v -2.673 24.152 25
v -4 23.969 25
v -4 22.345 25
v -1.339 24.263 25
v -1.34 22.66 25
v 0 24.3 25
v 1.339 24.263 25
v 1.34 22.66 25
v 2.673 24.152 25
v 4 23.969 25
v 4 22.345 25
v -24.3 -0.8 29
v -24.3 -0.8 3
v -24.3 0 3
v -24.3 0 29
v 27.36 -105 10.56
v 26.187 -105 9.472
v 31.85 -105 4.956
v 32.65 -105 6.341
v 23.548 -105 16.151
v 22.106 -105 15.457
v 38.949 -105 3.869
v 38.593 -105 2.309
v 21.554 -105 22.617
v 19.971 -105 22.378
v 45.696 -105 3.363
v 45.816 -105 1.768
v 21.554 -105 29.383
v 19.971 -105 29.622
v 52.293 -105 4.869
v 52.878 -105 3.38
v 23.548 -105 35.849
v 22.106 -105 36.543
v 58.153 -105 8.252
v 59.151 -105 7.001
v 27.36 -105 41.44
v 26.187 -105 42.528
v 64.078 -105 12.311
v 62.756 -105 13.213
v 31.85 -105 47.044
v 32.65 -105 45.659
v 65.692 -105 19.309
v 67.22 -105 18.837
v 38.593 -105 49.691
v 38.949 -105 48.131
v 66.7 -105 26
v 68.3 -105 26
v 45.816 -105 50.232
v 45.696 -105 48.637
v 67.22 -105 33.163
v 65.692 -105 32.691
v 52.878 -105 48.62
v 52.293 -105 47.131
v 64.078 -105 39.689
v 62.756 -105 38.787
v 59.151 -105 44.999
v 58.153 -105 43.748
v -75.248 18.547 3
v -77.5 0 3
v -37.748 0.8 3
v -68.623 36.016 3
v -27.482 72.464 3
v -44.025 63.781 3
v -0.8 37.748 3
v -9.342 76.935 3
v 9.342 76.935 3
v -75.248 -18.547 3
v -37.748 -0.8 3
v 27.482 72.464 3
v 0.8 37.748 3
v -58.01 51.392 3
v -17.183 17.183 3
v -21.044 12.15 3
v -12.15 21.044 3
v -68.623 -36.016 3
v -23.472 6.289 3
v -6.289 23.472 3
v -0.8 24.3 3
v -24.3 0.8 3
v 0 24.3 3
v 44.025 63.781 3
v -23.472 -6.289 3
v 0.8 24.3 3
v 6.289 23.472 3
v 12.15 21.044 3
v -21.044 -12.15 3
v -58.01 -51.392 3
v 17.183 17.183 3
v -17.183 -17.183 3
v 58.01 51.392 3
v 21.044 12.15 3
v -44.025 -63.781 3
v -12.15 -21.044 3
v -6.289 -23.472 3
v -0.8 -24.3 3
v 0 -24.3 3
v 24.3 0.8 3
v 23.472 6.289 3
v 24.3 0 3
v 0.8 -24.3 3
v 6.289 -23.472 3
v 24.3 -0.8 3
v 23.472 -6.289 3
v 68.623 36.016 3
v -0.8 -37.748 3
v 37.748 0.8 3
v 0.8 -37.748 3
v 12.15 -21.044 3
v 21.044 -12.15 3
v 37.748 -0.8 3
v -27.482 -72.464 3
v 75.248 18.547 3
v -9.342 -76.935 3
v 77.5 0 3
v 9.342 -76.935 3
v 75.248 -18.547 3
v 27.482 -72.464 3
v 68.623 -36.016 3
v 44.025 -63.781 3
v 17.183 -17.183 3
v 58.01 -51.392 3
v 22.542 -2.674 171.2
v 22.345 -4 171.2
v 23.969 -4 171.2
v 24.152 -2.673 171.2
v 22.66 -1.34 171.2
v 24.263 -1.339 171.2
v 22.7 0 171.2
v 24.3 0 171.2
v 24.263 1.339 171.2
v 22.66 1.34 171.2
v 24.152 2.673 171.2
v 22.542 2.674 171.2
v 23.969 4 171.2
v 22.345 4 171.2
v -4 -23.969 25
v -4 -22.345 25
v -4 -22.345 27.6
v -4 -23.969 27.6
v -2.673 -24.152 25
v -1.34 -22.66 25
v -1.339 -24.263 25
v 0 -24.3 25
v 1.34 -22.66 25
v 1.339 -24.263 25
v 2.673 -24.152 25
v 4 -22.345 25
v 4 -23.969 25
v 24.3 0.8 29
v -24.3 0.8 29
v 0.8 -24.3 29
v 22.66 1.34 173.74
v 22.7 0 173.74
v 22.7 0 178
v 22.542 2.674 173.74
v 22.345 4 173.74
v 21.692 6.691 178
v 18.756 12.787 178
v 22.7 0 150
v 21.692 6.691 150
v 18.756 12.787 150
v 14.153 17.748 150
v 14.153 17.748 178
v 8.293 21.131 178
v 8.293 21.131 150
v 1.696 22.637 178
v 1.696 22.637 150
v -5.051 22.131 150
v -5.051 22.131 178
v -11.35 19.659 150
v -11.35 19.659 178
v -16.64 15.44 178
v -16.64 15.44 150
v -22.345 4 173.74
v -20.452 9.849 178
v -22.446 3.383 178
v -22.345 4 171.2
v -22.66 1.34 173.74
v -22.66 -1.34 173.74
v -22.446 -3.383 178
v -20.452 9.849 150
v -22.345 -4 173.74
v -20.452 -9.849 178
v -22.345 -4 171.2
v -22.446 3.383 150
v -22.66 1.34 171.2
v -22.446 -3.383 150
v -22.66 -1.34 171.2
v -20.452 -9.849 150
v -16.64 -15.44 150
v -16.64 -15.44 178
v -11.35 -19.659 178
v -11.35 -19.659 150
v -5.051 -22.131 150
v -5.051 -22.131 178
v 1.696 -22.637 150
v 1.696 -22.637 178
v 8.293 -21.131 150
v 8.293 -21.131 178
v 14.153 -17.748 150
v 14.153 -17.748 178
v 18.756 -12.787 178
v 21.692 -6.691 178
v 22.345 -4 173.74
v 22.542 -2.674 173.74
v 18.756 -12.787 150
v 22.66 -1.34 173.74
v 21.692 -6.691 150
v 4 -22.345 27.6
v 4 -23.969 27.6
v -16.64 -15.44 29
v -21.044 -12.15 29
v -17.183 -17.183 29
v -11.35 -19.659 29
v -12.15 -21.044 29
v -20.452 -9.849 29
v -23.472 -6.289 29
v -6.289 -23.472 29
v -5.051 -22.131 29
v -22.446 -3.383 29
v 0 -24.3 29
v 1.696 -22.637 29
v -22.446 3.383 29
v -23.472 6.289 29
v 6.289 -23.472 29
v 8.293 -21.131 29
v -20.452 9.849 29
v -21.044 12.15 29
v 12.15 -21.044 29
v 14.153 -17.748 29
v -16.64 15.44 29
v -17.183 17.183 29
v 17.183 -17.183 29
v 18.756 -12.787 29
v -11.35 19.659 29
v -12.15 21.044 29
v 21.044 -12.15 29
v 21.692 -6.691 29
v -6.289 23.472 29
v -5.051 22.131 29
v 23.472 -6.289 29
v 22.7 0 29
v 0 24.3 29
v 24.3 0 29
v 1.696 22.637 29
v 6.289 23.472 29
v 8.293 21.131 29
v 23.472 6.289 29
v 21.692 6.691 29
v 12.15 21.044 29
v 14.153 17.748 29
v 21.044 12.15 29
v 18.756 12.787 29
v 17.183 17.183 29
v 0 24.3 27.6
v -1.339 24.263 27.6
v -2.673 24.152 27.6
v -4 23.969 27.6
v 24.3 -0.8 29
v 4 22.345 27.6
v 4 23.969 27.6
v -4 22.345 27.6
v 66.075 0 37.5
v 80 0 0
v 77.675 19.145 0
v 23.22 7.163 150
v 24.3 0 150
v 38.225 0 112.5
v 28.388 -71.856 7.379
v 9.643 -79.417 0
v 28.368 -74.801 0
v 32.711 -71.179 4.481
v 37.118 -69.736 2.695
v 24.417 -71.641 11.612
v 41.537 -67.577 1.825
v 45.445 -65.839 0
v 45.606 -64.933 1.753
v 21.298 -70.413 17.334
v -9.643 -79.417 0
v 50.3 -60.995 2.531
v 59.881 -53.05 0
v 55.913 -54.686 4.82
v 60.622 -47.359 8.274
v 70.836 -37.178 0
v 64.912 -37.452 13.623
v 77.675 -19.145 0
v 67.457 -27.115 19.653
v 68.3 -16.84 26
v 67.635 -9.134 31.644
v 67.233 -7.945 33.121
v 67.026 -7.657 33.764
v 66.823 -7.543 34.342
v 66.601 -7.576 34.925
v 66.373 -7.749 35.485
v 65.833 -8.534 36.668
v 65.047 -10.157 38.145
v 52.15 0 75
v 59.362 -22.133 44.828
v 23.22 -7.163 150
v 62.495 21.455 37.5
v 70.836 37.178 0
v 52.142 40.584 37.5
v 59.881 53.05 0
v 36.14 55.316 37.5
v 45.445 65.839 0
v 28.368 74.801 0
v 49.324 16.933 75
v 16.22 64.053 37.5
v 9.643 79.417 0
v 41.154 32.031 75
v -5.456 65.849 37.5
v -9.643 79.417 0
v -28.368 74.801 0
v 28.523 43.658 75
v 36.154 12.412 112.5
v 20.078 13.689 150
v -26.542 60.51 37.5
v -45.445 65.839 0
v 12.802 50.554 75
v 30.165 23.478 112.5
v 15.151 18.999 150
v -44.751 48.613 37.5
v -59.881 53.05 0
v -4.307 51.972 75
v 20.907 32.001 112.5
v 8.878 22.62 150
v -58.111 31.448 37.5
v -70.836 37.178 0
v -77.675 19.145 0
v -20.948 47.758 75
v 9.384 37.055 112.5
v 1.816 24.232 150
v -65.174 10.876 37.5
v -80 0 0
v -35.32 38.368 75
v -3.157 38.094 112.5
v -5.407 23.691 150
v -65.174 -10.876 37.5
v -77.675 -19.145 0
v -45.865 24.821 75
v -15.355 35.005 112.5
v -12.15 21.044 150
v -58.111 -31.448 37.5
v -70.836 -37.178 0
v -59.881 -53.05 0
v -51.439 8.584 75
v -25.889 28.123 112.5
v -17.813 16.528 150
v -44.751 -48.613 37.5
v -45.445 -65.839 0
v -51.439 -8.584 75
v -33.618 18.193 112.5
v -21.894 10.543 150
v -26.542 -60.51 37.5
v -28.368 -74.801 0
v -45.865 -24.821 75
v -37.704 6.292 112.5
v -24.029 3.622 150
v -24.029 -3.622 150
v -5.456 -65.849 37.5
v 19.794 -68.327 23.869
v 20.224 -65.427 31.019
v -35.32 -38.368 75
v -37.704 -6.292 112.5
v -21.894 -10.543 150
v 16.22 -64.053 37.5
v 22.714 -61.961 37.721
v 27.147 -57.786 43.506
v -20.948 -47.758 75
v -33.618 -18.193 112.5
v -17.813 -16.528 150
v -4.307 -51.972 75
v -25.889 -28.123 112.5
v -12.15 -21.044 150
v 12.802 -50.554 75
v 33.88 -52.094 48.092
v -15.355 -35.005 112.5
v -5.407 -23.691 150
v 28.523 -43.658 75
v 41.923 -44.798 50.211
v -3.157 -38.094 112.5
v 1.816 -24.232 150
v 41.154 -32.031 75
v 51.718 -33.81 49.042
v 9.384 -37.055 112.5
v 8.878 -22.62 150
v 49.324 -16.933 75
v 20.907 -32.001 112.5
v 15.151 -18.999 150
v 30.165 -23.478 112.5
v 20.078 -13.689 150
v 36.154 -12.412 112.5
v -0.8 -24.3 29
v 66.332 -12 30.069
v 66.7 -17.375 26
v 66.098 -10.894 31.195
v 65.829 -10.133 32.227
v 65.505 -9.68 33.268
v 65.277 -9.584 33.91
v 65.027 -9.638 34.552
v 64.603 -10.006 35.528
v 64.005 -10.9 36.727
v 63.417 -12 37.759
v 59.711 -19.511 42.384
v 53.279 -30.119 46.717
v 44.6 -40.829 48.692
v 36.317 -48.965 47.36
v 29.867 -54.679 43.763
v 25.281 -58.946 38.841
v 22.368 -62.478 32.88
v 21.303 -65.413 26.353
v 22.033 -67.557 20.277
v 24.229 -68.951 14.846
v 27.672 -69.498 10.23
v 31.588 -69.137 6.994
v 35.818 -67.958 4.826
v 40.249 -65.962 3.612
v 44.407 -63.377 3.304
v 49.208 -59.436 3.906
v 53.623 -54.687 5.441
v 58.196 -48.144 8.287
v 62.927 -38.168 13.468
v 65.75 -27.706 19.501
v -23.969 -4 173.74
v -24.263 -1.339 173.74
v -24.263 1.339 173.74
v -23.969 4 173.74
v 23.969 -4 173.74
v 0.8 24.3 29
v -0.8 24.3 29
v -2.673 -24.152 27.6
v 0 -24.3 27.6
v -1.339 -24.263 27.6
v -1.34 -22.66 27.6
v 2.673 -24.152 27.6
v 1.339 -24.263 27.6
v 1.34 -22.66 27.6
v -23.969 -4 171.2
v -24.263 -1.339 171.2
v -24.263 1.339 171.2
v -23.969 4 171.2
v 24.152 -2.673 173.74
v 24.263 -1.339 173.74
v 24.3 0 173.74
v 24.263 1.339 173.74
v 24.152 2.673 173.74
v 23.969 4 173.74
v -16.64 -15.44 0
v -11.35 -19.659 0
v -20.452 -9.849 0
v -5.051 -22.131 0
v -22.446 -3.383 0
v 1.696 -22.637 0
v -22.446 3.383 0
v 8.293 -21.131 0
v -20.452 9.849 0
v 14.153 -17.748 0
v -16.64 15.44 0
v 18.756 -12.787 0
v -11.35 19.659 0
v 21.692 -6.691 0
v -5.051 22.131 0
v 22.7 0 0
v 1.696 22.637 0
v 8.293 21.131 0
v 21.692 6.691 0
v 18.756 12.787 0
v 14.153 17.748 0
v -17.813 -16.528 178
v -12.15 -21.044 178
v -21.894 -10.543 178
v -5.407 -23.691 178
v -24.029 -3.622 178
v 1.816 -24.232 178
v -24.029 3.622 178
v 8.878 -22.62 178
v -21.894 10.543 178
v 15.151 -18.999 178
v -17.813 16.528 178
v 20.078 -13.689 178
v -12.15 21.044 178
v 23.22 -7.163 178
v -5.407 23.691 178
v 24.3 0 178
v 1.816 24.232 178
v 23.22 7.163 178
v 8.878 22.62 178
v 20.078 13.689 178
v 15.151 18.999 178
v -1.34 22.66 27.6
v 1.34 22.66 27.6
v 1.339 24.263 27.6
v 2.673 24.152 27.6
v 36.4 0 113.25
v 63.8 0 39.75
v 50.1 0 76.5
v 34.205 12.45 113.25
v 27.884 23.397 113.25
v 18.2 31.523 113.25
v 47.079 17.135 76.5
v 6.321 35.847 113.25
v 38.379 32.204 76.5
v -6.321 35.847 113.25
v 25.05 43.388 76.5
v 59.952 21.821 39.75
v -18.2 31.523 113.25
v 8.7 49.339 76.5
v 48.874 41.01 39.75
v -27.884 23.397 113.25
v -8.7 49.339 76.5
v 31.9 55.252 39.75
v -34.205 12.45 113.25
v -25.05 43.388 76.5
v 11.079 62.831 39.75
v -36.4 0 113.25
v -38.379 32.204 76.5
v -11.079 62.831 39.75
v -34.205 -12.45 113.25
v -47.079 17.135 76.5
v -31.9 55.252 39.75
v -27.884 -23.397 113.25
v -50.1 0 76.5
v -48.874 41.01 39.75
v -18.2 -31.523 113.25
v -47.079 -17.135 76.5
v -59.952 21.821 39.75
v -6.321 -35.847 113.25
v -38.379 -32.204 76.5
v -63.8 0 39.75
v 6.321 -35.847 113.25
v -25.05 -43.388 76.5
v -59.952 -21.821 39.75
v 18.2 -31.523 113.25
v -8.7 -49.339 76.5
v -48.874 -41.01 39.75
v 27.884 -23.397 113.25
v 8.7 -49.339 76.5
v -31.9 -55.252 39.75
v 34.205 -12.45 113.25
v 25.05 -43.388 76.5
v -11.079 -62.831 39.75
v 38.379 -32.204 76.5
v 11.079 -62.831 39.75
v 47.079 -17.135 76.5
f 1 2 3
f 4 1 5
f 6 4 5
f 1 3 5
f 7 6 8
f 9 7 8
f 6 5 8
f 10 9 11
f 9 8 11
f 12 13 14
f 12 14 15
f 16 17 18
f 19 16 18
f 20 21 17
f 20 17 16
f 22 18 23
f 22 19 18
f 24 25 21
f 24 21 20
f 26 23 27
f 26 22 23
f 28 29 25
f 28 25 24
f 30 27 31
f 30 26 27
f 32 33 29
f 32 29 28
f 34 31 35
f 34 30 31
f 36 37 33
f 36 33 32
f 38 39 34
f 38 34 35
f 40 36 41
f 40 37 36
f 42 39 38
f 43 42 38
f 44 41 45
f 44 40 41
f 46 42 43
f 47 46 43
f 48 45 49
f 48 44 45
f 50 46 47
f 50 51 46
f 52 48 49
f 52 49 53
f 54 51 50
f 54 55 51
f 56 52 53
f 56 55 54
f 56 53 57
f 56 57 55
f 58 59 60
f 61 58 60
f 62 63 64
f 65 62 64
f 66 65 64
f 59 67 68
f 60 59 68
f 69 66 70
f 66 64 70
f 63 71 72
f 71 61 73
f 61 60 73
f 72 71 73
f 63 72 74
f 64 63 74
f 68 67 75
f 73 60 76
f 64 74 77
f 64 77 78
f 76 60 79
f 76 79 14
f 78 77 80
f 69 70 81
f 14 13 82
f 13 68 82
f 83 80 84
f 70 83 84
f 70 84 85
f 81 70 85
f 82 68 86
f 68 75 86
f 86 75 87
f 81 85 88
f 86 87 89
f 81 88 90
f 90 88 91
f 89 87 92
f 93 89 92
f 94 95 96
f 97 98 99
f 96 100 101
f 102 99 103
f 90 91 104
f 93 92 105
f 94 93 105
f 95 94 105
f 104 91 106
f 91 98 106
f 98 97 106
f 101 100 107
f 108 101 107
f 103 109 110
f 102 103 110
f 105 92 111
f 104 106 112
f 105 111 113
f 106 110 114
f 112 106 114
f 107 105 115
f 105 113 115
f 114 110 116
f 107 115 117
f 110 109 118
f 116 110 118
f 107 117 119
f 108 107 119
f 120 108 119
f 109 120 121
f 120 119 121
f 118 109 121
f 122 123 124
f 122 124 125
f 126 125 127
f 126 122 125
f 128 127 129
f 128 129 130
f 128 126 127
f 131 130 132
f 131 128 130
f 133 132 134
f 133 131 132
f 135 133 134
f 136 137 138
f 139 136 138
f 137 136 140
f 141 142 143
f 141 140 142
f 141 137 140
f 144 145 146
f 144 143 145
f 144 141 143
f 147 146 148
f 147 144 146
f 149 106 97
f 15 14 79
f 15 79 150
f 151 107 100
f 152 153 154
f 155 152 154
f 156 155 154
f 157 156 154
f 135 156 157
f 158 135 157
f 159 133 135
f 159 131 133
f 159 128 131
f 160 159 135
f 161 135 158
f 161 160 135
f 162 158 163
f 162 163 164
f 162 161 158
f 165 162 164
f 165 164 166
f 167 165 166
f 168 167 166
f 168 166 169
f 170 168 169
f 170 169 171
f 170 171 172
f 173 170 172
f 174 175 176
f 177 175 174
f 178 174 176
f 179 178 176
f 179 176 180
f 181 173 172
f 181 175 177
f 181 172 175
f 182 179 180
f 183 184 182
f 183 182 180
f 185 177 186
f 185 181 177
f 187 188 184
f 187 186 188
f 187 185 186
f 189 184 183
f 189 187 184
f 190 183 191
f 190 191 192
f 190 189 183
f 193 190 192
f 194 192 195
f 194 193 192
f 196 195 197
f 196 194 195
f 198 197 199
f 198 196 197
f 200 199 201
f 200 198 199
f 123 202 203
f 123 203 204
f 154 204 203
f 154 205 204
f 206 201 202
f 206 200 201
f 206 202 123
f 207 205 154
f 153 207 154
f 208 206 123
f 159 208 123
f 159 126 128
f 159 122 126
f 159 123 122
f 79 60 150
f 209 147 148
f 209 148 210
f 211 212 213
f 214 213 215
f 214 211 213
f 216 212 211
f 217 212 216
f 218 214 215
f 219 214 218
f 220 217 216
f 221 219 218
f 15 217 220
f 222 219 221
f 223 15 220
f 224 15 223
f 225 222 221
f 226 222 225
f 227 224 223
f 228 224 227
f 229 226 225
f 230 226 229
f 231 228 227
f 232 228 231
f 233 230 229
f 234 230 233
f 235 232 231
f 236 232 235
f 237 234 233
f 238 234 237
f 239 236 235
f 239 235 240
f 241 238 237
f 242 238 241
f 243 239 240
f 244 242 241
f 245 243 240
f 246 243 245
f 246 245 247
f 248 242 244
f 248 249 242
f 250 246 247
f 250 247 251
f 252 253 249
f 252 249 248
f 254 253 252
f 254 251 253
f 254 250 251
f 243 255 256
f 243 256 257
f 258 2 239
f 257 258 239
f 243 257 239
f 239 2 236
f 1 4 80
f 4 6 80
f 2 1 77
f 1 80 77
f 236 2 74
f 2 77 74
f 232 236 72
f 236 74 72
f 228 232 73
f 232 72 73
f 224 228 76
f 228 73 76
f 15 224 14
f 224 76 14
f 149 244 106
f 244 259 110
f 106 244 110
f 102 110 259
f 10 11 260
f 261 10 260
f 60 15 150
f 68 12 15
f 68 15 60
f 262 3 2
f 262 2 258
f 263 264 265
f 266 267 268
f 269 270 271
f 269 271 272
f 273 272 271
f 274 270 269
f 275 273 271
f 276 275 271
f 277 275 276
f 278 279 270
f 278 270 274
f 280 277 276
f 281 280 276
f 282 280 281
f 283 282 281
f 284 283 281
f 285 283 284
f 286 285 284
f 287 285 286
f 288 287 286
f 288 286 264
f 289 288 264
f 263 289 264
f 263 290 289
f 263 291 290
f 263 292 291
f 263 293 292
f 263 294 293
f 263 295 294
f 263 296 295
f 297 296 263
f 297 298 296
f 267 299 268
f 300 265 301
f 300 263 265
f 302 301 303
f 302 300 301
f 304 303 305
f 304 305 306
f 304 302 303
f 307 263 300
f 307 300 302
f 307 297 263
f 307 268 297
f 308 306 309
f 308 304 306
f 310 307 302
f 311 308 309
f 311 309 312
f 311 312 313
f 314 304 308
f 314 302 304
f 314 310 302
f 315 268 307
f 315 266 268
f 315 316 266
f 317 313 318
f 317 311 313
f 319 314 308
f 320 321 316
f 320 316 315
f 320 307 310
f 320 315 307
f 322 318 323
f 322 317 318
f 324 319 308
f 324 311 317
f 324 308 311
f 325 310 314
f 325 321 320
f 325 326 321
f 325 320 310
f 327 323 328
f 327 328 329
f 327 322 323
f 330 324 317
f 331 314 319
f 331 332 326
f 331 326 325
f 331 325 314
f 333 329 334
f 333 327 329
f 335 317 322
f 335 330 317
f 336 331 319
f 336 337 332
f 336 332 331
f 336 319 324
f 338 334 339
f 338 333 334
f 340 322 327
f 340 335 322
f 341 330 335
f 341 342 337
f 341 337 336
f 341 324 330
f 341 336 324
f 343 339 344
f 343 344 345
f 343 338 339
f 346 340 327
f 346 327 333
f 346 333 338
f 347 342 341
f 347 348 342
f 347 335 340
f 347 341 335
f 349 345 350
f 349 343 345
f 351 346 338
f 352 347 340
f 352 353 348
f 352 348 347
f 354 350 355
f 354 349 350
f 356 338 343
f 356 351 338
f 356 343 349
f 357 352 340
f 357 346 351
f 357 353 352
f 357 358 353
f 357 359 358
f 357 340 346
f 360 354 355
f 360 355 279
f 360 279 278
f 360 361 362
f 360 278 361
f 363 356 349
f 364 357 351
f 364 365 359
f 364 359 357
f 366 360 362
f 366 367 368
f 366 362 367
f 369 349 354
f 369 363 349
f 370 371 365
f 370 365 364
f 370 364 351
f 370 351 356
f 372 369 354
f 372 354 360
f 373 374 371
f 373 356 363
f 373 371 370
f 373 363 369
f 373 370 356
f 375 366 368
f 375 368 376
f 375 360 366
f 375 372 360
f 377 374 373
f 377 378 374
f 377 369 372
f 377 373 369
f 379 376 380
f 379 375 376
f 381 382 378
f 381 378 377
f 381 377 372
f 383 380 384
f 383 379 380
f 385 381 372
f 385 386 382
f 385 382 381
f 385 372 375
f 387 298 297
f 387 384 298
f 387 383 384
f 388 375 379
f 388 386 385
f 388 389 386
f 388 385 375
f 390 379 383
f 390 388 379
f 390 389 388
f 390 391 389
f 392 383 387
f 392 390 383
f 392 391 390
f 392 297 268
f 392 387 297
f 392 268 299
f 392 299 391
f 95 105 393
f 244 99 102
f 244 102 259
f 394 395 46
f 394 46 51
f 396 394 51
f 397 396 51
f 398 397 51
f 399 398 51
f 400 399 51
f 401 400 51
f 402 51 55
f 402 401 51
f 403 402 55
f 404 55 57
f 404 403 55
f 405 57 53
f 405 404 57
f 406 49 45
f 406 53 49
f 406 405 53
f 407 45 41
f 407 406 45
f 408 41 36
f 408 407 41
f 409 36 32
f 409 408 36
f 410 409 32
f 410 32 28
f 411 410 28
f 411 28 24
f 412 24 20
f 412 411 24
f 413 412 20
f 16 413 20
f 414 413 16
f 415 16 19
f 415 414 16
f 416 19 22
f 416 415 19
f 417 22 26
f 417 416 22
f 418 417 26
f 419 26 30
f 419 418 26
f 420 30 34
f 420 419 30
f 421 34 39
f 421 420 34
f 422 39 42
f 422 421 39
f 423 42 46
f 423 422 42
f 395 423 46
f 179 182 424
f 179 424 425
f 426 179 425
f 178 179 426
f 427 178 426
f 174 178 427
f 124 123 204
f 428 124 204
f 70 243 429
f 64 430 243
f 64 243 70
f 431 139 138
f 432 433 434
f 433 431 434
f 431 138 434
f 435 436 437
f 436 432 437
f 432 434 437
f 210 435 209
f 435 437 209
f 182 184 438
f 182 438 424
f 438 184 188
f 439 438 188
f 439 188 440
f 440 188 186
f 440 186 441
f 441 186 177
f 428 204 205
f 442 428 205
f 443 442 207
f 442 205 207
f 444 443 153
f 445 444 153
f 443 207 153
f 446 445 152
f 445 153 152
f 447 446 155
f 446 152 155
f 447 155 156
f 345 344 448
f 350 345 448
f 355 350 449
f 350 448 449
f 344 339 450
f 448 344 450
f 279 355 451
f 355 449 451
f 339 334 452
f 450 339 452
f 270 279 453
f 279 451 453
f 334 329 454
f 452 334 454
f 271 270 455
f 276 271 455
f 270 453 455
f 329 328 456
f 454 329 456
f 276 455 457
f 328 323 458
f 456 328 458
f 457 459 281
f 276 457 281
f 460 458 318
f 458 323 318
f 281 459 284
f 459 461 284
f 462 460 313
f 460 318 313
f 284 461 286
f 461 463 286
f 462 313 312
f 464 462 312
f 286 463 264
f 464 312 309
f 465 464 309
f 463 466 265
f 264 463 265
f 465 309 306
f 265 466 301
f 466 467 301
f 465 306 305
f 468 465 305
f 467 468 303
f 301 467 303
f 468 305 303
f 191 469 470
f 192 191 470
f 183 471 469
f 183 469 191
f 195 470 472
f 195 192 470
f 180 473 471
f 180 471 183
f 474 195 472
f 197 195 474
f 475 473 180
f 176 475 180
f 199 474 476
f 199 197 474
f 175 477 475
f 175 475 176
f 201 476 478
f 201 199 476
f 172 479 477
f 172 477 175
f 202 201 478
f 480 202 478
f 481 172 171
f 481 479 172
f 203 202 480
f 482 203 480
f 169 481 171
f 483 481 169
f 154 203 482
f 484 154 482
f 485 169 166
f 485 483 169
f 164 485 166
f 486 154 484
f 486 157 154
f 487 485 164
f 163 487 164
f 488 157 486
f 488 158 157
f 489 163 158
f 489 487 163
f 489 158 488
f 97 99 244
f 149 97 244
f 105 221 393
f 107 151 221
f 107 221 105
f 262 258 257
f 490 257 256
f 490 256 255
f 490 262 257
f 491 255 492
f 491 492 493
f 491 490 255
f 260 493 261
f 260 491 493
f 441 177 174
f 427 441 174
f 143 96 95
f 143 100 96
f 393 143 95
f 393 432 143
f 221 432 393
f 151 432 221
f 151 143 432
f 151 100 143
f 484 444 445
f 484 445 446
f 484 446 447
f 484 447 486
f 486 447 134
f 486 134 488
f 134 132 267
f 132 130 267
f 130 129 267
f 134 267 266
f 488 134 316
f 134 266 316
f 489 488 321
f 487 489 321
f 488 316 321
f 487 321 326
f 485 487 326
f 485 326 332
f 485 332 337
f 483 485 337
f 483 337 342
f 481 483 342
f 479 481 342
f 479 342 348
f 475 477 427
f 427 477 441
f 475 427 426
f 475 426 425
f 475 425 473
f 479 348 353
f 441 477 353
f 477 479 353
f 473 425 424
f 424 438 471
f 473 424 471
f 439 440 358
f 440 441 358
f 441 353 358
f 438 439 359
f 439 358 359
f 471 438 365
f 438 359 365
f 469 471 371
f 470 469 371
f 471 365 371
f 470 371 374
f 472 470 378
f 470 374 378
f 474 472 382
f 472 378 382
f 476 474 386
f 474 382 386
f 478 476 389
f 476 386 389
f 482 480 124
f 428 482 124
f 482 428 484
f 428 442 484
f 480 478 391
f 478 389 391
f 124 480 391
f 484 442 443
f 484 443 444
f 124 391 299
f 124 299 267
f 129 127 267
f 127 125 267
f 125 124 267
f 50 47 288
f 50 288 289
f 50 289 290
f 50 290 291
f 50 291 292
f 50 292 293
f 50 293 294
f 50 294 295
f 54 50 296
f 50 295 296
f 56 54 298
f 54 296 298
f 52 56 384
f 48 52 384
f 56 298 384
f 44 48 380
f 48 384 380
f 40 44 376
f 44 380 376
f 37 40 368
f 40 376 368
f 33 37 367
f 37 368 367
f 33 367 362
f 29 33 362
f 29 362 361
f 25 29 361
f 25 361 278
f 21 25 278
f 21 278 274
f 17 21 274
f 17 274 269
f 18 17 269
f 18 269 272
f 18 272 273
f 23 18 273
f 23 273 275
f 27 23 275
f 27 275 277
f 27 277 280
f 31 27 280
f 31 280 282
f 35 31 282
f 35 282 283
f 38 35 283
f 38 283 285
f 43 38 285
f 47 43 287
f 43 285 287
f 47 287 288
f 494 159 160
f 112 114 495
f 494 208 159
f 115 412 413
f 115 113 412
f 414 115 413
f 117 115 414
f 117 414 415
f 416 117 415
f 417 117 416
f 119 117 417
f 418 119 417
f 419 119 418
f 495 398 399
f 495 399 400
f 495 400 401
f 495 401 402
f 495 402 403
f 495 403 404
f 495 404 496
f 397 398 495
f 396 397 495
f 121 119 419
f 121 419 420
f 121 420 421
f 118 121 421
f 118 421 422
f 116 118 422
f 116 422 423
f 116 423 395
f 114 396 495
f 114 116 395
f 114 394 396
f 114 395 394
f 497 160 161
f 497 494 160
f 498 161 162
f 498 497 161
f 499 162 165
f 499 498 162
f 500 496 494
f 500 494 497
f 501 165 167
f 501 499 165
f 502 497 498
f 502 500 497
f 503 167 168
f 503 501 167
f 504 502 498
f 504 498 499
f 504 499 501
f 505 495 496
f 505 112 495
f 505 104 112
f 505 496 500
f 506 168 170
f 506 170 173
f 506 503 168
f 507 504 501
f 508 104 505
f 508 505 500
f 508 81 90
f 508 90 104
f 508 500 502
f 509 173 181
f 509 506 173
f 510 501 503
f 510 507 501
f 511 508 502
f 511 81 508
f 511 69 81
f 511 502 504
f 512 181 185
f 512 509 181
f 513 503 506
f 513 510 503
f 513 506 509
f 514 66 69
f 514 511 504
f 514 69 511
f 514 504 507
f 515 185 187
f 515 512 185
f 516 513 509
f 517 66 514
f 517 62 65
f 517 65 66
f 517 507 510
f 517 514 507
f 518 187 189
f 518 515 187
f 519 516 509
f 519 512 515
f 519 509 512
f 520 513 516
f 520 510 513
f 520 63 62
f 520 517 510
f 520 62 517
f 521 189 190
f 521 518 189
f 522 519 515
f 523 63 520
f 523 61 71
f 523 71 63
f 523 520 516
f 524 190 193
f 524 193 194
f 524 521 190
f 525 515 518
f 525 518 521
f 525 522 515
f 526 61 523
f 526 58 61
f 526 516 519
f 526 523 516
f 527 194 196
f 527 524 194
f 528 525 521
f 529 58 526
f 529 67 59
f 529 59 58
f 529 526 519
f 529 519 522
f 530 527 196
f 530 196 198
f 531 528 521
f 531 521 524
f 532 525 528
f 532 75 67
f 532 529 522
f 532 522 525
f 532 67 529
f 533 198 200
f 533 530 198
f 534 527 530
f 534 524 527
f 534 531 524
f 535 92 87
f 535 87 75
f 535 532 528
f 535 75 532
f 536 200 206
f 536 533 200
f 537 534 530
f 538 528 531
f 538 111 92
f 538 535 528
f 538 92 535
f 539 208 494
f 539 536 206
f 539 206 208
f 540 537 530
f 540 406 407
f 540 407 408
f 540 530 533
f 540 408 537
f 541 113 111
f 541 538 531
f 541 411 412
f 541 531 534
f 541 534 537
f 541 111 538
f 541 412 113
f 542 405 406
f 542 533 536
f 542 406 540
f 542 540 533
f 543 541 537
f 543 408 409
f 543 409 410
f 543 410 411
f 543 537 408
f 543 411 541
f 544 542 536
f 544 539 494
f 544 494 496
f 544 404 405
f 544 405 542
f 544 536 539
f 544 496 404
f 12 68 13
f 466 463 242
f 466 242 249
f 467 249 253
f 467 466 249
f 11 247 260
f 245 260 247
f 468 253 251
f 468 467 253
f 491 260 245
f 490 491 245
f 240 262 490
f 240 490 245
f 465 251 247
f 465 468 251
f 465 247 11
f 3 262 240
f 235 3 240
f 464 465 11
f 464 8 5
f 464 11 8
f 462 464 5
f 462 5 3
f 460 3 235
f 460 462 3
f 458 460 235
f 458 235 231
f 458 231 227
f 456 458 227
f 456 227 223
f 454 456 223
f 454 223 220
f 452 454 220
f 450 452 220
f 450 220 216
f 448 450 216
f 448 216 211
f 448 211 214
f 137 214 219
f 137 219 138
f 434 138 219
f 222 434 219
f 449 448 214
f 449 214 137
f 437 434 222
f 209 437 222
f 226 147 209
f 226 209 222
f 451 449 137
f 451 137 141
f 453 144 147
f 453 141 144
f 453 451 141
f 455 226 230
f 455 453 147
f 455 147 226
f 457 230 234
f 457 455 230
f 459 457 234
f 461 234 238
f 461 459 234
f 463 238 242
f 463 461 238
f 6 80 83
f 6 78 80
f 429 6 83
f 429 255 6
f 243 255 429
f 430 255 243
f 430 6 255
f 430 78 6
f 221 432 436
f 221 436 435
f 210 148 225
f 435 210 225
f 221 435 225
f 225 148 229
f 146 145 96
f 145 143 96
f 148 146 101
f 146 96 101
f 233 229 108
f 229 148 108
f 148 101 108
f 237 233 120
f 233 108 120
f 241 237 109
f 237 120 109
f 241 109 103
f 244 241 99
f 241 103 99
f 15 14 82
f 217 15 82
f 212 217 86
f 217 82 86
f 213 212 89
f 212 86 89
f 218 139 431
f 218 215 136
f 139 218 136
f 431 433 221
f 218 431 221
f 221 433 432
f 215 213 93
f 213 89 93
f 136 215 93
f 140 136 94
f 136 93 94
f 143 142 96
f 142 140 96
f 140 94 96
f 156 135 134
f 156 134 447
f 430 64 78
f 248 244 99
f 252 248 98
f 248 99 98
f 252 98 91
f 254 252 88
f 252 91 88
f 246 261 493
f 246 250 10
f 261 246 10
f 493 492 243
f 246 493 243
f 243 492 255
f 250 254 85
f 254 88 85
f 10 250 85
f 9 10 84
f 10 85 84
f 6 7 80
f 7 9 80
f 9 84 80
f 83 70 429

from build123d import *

# Parameters (mm, degrees)
SKETCH002_R          = 80
SKETCH003_R          = 24.3
SKETCH004_R          = 24.3
PAD001_DEPTH         = 105
SKETCH005_R          = 22.7
SKETCH006_R          = 77.5
SKETCH011_R          = 22.7
POCKET001_DEPTH      = 5
POCKET001_DEPTH_BACK = 100
SKETCH008_R          = 22.7
POCKET002_DEPTH      = 5
SKETCH009_R          = 24.3
SKETCH009_R_2        = 22.7
PAD002_DEPTH         = 28
SKETCH010_W          = 8
SKETCH010_H          = 2.54
POCKET003_DEPTH      = 100
POCKET003_DEPTH_BACK = 100
SKETCH_R             = 24.3
SKETCH_R_2           = 22.7
PAD_DEPTH            = 29
SKETCH001_W          = 8
SKETCH001_H          = 2.6
POCKET_DEPTH         = 100
POCKET_DEPTH_BACK    = 100
PAD003_DEPTH         = 0.8
PAD003_DEPTH_BACK    = 0.8
POLARPATTERN_COUNT   = 4


with BuildPart() as body001:
    # Sketch002 → AdditiveLoft section 0
    with BuildSketch(Plane.XY):
        Circle(SKETCH002_R)
    # Sketch003 → AdditiveLoft section 1
    with BuildSketch(Plane.XY.offset(150)):
        Circle(SKETCH003_R)
    loft()

    # Sketch004 → Pad001 (new body)
    with BuildSketch(Plane.XZ):
        with Locations((44, 26)):
            Circle(SKETCH004_R)
    extrude(amount=PAD001_DEPTH)

    # Sketch005 (on Face3 of Pad001) → SubtractiveLoft section 0
    with BuildSketch(Plane.XY.offset(150)):
        Circle(SKETCH005_R)
    # Sketch006 (on Face1 of Pad001) → SubtractiveLoft section 1
    with BuildSketch(Plane(origin=(0, 0, 3), x_dir=(1, 0, 0), z_dir=(0, 0, -1))):
        Circle(SKETCH006_R)
    loft(mode=Mode.SUBTRACT)

    # Sketch011 → Pocket001 (cut, two sides)
    with BuildSketch(Plane.XZ.offset(12)) as pocket001_sk:
        with Locations((44, 26)):
            Circle(SKETCH011_R)
    extrude(amount=-POCKET001_DEPTH, mode=Mode.SUBTRACT)
    extrude(pocket001_sk.sketch, amount=POCKET001_DEPTH_BACK, mode=Mode.SUBTRACT)

    # Sketch008 → Pocket002 (cut)
    with BuildSketch(Plane.XY):
        Circle(SKETCH008_R)
    extrude(amount=POCKET002_DEPTH, mode=Mode.SUBTRACT)

    # Sketch009 → Pad002 (join)
    with BuildSketch(Plane.XY.offset(150)):
        Circle(SKETCH009_R)
        Circle(SKETCH009_R_2, mode=Mode.SUBTRACT)
    extrude(amount=PAD002_DEPTH)

    # Sketch010 → Pocket003 (cut, two sides)
    with BuildSketch(Plane.YZ) as pocket003_sk:
        with Locations((0, 172.47)):
            Rectangle(SKETCH010_W, SKETCH010_H)
    extrude(amount=-POCKET003_DEPTH, mode=Mode.SUBTRACT)
    extrude(pocket003_sk.sketch, amount=POCKET003_DEPTH_BACK, mode=Mode.SUBTRACT)


with BuildPart() as body:
    # Sketch → Pad (new body)
    with BuildSketch(Plane.XY):
        Circle(SKETCH_R)
        Circle(SKETCH_R_2, mode=Mode.SUBTRACT)
    extrude(amount=PAD_DEPTH)

    # Sketch001 → Pocket (cut, two sides)
    with BuildSketch(Plane.XZ) as pocket_sk:
        with Locations((0, 26.3)):
            Rectangle(SKETCH001_W, SKETCH001_H)
    extrude(amount=-POCKET_DEPTH, mode=Mode.SUBTRACT)
    extrude(pocket_sk.sketch, amount=POCKET_DEPTH_BACK, mode=Mode.SUBTRACT)

    # Boolean: union Body001
    add(body001.part)

    # Sketch012 → Pad003 (join, two sides)
    with BuildSketch(Plane.XZ) as pad003_sk:
        Polygon((24.3, 29), (39.3, 0), (24.3, 0), align=None)
    pad003 = extrude(amount=PAD003_DEPTH) + extrude(pad003_sk.sketch, amount=-PAD003_DEPTH_BACK)

    # PolarPattern: Pad003 ×4 about axis
    polarpattern_axis = Axis((0, 0, 0), (0, 0, 1))
    for i in range(1, POLARPATTERN_COUNT):
        add(pad003.rotate(polarpattern_axis, i * 360 / POLARPATTERN_COUNT))


solid = body.part
